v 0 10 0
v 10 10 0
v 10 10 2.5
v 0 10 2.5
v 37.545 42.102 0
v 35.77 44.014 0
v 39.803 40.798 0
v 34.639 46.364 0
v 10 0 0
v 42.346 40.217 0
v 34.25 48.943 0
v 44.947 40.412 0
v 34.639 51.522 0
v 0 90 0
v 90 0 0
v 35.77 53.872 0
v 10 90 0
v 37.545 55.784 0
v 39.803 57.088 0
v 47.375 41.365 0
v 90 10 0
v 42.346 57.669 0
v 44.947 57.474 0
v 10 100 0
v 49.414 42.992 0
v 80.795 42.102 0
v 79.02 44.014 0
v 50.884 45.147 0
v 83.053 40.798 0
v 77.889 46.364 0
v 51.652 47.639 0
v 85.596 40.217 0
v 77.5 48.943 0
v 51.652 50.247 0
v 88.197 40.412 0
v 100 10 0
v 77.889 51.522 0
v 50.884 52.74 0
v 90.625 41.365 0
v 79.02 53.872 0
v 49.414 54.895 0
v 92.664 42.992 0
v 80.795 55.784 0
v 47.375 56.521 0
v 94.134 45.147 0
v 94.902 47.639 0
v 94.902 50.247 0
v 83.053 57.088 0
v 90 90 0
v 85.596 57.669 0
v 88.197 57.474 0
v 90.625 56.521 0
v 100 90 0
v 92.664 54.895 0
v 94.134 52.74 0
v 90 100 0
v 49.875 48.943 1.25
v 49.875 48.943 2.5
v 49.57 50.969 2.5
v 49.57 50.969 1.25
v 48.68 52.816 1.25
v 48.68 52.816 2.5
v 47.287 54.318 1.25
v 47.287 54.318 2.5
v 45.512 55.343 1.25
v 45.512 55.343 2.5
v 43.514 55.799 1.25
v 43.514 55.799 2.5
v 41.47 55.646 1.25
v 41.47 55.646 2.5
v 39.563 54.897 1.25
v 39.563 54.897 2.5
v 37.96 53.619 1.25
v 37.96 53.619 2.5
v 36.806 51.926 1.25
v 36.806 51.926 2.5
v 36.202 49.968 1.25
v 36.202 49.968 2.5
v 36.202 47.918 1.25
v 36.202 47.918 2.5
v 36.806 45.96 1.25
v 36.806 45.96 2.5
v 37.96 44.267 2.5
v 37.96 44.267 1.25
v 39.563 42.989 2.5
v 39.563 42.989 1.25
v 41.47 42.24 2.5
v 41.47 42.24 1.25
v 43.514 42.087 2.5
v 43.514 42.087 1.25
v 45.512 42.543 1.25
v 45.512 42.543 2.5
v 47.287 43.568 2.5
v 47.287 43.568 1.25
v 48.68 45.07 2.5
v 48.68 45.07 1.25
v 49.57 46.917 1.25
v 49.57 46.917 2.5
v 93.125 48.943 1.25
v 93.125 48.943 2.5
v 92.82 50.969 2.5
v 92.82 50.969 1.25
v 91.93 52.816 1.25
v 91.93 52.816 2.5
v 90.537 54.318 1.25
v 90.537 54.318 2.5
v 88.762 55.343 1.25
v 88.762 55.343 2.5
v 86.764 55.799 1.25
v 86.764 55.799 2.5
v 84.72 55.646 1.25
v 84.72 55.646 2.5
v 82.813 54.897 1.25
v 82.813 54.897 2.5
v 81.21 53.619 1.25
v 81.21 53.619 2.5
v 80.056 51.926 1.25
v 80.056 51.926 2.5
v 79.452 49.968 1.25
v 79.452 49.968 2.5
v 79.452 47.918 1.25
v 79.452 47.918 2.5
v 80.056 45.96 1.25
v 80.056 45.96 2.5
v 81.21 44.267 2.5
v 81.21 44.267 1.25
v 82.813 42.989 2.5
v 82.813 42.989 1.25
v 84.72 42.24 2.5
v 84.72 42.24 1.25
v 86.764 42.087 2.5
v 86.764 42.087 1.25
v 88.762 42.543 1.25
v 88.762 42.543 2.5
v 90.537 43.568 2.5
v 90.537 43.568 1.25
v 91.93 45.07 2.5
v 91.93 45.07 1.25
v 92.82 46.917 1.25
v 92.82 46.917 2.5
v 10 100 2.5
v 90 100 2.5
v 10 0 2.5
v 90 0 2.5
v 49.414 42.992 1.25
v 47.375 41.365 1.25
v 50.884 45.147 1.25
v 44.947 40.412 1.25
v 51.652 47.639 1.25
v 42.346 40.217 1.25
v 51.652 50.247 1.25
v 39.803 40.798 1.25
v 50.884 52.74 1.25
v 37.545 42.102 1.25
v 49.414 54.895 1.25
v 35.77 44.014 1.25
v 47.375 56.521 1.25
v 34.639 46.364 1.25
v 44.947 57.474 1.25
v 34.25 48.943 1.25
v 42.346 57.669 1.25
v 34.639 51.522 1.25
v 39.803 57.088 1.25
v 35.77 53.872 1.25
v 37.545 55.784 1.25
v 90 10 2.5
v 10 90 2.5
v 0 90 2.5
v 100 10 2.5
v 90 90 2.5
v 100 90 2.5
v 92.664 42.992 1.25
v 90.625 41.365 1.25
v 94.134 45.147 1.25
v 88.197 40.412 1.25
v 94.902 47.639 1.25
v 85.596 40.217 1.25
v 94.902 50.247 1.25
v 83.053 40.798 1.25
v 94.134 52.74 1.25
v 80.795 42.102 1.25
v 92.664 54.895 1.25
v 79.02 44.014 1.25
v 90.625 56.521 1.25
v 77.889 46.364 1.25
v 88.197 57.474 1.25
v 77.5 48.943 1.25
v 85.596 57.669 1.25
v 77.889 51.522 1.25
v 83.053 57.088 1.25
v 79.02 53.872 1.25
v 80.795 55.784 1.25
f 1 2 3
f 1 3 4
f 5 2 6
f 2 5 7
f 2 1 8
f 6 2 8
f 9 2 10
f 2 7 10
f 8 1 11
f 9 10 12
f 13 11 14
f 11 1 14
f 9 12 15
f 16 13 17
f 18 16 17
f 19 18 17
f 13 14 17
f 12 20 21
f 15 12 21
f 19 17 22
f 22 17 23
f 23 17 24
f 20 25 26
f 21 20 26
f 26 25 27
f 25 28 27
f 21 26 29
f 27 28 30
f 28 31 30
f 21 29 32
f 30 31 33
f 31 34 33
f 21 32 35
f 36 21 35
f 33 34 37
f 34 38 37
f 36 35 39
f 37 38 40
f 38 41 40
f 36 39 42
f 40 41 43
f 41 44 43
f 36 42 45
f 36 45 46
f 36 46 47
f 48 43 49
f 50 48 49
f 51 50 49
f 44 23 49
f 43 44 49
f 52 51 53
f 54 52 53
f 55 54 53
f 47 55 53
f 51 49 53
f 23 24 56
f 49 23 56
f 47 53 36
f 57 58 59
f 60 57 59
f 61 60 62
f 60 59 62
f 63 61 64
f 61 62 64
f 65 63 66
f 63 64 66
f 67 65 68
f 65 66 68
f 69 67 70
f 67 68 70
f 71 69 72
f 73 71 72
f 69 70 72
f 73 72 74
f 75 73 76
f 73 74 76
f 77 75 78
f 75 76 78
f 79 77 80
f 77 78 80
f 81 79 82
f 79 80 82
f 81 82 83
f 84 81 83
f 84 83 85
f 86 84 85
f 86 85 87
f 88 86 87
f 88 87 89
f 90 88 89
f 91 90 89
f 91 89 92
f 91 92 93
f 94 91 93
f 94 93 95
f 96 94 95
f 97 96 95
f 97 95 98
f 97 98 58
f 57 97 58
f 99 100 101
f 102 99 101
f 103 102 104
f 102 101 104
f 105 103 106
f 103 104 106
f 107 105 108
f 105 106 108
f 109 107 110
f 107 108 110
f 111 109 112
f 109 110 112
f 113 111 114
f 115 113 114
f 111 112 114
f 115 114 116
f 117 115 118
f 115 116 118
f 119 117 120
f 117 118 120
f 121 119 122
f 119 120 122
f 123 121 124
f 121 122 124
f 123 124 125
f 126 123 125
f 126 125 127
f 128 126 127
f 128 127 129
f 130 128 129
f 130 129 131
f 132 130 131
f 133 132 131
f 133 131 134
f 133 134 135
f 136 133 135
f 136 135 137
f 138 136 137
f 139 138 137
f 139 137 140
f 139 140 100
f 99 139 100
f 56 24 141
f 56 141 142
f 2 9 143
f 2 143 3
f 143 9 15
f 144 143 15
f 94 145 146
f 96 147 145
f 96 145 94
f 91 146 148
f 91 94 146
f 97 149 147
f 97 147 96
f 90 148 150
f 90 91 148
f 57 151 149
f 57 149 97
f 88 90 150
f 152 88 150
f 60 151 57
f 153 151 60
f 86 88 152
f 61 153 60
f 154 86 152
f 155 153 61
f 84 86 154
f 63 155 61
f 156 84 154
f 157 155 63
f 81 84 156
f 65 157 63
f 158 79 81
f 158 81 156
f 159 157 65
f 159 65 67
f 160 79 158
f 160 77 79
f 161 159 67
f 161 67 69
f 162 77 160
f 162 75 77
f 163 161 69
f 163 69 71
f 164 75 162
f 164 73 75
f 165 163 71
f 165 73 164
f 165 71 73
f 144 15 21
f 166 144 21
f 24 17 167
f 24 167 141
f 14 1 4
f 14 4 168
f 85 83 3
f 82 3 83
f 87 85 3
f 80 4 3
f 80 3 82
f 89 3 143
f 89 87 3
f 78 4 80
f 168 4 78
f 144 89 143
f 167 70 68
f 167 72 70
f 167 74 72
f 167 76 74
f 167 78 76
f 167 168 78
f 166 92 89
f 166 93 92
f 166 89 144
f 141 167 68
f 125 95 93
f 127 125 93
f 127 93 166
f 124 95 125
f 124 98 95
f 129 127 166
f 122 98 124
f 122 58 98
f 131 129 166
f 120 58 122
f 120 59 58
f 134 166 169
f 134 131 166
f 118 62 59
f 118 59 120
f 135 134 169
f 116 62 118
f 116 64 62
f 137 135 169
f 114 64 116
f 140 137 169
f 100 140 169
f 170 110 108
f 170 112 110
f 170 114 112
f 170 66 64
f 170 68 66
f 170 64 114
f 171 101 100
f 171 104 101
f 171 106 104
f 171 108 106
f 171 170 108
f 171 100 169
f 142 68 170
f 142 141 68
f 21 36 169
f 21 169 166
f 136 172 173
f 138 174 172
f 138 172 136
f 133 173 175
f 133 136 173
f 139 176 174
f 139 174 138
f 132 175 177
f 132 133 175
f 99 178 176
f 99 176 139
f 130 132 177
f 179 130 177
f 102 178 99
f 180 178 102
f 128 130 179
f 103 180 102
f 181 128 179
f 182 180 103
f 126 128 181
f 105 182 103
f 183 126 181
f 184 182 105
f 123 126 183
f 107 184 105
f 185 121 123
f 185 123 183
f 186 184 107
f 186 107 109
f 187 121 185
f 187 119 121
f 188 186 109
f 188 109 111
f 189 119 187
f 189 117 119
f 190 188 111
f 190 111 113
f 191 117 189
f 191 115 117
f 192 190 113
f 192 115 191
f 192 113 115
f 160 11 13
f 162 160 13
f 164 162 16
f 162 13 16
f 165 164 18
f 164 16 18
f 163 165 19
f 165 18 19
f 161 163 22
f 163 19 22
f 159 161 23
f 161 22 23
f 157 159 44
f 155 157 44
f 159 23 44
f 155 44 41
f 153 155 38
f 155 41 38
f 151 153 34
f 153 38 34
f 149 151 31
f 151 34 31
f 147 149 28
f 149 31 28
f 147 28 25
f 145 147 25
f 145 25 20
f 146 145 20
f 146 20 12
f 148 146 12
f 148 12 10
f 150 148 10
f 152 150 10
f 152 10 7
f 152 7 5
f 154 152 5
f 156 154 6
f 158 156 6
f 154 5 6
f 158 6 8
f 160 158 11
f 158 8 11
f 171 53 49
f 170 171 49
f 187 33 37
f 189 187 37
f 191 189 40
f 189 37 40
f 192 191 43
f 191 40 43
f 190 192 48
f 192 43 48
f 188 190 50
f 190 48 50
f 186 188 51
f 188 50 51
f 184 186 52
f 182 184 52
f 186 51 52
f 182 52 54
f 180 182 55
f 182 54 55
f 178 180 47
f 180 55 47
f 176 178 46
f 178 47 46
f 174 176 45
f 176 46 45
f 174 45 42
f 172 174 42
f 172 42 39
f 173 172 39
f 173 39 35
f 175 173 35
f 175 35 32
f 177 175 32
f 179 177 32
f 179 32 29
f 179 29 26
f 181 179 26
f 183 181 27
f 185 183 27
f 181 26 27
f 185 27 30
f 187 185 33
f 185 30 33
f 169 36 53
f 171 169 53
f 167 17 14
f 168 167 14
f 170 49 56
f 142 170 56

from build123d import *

# Parameters (mm, degrees)
SKETCH1_W           = 100
SKETCH1_H           = 100
BOSS_EXTRUDE1_DEPTH = 2.5
SKETCH4_R           = 6.875
CUT_EXTRUDE2_DEPTH  = 142.443451598
SKETCH5_R           = 8.75
CUT_EXTRUDE3_DEPTH  = 1.25
SKETCH6_W           = 10
SKETCH6_H           = 10
CUT_EXTRUDE4_DEPTH  = 142.443451598


with BuildPart() as part:
    # Sketch1 → Boss-Extrude1 (new body)
    with BuildSketch(Plane.XY):
        with Locations((50, 50)):
            Rectangle(SKETCH1_W, SKETCH1_H)
    extrude(amount=BOSS_EXTRUDE1_DEPTH)

    # Sketch4 → Cut-Extrude2 (cut, through all)
    with BuildSketch(Plane.XY.offset(2.5)):
        with Locations((86.250042234, 48.943031999)):
            Circle(SKETCH4_R)
        with Locations((43.000042234, 48.943031999)):
            Circle(SKETCH4_R)
    extrude(amount=-CUT_EXTRUDE2_DEPTH, mode=Mode.SUBTRACT)

    # Sketch5 → Cut-Extrude3 (cut)
    with BuildSketch(Plane(origin=(0, 0, 0), x_dir=(-1, 0, 0), z_dir=(0, 0, -1))):
        with Locations((-86.250042234, 48.943031999)):
            Circle(SKETCH5_R)
        with Locations((-43.000042234, 48.943031999)):
            Circle(SKETCH5_R)
    extrude(amount=-CUT_EXTRUDE3_DEPTH, mode=Mode.SUBTRACT)

    # Sketch6 → Cut-Extrude4 (cut, through all)
    with BuildSketch(Plane(origin=(0, 0, 0), x_dir=(-1, 0, 0), z_dir=(0, 0, -1))):
        with Locations((-95, 95)):
            Rectangle(SKETCH6_W, SKETCH6_H)
        with Locations((-95, 5)):
            Rectangle(SKETCH6_W, SKETCH6_H)
        with Locations((-5, 95)):
            Rectangle(SKETCH6_W, SKETCH6_H)
        with Locations((-5, 5)):
            Rectangle(SKETCH6_W, SKETCH6_H)
    extrude(amount=-CUT_EXTRUDE4_DEPTH, mode=Mode.SUBTRACT)


solid = part.part
